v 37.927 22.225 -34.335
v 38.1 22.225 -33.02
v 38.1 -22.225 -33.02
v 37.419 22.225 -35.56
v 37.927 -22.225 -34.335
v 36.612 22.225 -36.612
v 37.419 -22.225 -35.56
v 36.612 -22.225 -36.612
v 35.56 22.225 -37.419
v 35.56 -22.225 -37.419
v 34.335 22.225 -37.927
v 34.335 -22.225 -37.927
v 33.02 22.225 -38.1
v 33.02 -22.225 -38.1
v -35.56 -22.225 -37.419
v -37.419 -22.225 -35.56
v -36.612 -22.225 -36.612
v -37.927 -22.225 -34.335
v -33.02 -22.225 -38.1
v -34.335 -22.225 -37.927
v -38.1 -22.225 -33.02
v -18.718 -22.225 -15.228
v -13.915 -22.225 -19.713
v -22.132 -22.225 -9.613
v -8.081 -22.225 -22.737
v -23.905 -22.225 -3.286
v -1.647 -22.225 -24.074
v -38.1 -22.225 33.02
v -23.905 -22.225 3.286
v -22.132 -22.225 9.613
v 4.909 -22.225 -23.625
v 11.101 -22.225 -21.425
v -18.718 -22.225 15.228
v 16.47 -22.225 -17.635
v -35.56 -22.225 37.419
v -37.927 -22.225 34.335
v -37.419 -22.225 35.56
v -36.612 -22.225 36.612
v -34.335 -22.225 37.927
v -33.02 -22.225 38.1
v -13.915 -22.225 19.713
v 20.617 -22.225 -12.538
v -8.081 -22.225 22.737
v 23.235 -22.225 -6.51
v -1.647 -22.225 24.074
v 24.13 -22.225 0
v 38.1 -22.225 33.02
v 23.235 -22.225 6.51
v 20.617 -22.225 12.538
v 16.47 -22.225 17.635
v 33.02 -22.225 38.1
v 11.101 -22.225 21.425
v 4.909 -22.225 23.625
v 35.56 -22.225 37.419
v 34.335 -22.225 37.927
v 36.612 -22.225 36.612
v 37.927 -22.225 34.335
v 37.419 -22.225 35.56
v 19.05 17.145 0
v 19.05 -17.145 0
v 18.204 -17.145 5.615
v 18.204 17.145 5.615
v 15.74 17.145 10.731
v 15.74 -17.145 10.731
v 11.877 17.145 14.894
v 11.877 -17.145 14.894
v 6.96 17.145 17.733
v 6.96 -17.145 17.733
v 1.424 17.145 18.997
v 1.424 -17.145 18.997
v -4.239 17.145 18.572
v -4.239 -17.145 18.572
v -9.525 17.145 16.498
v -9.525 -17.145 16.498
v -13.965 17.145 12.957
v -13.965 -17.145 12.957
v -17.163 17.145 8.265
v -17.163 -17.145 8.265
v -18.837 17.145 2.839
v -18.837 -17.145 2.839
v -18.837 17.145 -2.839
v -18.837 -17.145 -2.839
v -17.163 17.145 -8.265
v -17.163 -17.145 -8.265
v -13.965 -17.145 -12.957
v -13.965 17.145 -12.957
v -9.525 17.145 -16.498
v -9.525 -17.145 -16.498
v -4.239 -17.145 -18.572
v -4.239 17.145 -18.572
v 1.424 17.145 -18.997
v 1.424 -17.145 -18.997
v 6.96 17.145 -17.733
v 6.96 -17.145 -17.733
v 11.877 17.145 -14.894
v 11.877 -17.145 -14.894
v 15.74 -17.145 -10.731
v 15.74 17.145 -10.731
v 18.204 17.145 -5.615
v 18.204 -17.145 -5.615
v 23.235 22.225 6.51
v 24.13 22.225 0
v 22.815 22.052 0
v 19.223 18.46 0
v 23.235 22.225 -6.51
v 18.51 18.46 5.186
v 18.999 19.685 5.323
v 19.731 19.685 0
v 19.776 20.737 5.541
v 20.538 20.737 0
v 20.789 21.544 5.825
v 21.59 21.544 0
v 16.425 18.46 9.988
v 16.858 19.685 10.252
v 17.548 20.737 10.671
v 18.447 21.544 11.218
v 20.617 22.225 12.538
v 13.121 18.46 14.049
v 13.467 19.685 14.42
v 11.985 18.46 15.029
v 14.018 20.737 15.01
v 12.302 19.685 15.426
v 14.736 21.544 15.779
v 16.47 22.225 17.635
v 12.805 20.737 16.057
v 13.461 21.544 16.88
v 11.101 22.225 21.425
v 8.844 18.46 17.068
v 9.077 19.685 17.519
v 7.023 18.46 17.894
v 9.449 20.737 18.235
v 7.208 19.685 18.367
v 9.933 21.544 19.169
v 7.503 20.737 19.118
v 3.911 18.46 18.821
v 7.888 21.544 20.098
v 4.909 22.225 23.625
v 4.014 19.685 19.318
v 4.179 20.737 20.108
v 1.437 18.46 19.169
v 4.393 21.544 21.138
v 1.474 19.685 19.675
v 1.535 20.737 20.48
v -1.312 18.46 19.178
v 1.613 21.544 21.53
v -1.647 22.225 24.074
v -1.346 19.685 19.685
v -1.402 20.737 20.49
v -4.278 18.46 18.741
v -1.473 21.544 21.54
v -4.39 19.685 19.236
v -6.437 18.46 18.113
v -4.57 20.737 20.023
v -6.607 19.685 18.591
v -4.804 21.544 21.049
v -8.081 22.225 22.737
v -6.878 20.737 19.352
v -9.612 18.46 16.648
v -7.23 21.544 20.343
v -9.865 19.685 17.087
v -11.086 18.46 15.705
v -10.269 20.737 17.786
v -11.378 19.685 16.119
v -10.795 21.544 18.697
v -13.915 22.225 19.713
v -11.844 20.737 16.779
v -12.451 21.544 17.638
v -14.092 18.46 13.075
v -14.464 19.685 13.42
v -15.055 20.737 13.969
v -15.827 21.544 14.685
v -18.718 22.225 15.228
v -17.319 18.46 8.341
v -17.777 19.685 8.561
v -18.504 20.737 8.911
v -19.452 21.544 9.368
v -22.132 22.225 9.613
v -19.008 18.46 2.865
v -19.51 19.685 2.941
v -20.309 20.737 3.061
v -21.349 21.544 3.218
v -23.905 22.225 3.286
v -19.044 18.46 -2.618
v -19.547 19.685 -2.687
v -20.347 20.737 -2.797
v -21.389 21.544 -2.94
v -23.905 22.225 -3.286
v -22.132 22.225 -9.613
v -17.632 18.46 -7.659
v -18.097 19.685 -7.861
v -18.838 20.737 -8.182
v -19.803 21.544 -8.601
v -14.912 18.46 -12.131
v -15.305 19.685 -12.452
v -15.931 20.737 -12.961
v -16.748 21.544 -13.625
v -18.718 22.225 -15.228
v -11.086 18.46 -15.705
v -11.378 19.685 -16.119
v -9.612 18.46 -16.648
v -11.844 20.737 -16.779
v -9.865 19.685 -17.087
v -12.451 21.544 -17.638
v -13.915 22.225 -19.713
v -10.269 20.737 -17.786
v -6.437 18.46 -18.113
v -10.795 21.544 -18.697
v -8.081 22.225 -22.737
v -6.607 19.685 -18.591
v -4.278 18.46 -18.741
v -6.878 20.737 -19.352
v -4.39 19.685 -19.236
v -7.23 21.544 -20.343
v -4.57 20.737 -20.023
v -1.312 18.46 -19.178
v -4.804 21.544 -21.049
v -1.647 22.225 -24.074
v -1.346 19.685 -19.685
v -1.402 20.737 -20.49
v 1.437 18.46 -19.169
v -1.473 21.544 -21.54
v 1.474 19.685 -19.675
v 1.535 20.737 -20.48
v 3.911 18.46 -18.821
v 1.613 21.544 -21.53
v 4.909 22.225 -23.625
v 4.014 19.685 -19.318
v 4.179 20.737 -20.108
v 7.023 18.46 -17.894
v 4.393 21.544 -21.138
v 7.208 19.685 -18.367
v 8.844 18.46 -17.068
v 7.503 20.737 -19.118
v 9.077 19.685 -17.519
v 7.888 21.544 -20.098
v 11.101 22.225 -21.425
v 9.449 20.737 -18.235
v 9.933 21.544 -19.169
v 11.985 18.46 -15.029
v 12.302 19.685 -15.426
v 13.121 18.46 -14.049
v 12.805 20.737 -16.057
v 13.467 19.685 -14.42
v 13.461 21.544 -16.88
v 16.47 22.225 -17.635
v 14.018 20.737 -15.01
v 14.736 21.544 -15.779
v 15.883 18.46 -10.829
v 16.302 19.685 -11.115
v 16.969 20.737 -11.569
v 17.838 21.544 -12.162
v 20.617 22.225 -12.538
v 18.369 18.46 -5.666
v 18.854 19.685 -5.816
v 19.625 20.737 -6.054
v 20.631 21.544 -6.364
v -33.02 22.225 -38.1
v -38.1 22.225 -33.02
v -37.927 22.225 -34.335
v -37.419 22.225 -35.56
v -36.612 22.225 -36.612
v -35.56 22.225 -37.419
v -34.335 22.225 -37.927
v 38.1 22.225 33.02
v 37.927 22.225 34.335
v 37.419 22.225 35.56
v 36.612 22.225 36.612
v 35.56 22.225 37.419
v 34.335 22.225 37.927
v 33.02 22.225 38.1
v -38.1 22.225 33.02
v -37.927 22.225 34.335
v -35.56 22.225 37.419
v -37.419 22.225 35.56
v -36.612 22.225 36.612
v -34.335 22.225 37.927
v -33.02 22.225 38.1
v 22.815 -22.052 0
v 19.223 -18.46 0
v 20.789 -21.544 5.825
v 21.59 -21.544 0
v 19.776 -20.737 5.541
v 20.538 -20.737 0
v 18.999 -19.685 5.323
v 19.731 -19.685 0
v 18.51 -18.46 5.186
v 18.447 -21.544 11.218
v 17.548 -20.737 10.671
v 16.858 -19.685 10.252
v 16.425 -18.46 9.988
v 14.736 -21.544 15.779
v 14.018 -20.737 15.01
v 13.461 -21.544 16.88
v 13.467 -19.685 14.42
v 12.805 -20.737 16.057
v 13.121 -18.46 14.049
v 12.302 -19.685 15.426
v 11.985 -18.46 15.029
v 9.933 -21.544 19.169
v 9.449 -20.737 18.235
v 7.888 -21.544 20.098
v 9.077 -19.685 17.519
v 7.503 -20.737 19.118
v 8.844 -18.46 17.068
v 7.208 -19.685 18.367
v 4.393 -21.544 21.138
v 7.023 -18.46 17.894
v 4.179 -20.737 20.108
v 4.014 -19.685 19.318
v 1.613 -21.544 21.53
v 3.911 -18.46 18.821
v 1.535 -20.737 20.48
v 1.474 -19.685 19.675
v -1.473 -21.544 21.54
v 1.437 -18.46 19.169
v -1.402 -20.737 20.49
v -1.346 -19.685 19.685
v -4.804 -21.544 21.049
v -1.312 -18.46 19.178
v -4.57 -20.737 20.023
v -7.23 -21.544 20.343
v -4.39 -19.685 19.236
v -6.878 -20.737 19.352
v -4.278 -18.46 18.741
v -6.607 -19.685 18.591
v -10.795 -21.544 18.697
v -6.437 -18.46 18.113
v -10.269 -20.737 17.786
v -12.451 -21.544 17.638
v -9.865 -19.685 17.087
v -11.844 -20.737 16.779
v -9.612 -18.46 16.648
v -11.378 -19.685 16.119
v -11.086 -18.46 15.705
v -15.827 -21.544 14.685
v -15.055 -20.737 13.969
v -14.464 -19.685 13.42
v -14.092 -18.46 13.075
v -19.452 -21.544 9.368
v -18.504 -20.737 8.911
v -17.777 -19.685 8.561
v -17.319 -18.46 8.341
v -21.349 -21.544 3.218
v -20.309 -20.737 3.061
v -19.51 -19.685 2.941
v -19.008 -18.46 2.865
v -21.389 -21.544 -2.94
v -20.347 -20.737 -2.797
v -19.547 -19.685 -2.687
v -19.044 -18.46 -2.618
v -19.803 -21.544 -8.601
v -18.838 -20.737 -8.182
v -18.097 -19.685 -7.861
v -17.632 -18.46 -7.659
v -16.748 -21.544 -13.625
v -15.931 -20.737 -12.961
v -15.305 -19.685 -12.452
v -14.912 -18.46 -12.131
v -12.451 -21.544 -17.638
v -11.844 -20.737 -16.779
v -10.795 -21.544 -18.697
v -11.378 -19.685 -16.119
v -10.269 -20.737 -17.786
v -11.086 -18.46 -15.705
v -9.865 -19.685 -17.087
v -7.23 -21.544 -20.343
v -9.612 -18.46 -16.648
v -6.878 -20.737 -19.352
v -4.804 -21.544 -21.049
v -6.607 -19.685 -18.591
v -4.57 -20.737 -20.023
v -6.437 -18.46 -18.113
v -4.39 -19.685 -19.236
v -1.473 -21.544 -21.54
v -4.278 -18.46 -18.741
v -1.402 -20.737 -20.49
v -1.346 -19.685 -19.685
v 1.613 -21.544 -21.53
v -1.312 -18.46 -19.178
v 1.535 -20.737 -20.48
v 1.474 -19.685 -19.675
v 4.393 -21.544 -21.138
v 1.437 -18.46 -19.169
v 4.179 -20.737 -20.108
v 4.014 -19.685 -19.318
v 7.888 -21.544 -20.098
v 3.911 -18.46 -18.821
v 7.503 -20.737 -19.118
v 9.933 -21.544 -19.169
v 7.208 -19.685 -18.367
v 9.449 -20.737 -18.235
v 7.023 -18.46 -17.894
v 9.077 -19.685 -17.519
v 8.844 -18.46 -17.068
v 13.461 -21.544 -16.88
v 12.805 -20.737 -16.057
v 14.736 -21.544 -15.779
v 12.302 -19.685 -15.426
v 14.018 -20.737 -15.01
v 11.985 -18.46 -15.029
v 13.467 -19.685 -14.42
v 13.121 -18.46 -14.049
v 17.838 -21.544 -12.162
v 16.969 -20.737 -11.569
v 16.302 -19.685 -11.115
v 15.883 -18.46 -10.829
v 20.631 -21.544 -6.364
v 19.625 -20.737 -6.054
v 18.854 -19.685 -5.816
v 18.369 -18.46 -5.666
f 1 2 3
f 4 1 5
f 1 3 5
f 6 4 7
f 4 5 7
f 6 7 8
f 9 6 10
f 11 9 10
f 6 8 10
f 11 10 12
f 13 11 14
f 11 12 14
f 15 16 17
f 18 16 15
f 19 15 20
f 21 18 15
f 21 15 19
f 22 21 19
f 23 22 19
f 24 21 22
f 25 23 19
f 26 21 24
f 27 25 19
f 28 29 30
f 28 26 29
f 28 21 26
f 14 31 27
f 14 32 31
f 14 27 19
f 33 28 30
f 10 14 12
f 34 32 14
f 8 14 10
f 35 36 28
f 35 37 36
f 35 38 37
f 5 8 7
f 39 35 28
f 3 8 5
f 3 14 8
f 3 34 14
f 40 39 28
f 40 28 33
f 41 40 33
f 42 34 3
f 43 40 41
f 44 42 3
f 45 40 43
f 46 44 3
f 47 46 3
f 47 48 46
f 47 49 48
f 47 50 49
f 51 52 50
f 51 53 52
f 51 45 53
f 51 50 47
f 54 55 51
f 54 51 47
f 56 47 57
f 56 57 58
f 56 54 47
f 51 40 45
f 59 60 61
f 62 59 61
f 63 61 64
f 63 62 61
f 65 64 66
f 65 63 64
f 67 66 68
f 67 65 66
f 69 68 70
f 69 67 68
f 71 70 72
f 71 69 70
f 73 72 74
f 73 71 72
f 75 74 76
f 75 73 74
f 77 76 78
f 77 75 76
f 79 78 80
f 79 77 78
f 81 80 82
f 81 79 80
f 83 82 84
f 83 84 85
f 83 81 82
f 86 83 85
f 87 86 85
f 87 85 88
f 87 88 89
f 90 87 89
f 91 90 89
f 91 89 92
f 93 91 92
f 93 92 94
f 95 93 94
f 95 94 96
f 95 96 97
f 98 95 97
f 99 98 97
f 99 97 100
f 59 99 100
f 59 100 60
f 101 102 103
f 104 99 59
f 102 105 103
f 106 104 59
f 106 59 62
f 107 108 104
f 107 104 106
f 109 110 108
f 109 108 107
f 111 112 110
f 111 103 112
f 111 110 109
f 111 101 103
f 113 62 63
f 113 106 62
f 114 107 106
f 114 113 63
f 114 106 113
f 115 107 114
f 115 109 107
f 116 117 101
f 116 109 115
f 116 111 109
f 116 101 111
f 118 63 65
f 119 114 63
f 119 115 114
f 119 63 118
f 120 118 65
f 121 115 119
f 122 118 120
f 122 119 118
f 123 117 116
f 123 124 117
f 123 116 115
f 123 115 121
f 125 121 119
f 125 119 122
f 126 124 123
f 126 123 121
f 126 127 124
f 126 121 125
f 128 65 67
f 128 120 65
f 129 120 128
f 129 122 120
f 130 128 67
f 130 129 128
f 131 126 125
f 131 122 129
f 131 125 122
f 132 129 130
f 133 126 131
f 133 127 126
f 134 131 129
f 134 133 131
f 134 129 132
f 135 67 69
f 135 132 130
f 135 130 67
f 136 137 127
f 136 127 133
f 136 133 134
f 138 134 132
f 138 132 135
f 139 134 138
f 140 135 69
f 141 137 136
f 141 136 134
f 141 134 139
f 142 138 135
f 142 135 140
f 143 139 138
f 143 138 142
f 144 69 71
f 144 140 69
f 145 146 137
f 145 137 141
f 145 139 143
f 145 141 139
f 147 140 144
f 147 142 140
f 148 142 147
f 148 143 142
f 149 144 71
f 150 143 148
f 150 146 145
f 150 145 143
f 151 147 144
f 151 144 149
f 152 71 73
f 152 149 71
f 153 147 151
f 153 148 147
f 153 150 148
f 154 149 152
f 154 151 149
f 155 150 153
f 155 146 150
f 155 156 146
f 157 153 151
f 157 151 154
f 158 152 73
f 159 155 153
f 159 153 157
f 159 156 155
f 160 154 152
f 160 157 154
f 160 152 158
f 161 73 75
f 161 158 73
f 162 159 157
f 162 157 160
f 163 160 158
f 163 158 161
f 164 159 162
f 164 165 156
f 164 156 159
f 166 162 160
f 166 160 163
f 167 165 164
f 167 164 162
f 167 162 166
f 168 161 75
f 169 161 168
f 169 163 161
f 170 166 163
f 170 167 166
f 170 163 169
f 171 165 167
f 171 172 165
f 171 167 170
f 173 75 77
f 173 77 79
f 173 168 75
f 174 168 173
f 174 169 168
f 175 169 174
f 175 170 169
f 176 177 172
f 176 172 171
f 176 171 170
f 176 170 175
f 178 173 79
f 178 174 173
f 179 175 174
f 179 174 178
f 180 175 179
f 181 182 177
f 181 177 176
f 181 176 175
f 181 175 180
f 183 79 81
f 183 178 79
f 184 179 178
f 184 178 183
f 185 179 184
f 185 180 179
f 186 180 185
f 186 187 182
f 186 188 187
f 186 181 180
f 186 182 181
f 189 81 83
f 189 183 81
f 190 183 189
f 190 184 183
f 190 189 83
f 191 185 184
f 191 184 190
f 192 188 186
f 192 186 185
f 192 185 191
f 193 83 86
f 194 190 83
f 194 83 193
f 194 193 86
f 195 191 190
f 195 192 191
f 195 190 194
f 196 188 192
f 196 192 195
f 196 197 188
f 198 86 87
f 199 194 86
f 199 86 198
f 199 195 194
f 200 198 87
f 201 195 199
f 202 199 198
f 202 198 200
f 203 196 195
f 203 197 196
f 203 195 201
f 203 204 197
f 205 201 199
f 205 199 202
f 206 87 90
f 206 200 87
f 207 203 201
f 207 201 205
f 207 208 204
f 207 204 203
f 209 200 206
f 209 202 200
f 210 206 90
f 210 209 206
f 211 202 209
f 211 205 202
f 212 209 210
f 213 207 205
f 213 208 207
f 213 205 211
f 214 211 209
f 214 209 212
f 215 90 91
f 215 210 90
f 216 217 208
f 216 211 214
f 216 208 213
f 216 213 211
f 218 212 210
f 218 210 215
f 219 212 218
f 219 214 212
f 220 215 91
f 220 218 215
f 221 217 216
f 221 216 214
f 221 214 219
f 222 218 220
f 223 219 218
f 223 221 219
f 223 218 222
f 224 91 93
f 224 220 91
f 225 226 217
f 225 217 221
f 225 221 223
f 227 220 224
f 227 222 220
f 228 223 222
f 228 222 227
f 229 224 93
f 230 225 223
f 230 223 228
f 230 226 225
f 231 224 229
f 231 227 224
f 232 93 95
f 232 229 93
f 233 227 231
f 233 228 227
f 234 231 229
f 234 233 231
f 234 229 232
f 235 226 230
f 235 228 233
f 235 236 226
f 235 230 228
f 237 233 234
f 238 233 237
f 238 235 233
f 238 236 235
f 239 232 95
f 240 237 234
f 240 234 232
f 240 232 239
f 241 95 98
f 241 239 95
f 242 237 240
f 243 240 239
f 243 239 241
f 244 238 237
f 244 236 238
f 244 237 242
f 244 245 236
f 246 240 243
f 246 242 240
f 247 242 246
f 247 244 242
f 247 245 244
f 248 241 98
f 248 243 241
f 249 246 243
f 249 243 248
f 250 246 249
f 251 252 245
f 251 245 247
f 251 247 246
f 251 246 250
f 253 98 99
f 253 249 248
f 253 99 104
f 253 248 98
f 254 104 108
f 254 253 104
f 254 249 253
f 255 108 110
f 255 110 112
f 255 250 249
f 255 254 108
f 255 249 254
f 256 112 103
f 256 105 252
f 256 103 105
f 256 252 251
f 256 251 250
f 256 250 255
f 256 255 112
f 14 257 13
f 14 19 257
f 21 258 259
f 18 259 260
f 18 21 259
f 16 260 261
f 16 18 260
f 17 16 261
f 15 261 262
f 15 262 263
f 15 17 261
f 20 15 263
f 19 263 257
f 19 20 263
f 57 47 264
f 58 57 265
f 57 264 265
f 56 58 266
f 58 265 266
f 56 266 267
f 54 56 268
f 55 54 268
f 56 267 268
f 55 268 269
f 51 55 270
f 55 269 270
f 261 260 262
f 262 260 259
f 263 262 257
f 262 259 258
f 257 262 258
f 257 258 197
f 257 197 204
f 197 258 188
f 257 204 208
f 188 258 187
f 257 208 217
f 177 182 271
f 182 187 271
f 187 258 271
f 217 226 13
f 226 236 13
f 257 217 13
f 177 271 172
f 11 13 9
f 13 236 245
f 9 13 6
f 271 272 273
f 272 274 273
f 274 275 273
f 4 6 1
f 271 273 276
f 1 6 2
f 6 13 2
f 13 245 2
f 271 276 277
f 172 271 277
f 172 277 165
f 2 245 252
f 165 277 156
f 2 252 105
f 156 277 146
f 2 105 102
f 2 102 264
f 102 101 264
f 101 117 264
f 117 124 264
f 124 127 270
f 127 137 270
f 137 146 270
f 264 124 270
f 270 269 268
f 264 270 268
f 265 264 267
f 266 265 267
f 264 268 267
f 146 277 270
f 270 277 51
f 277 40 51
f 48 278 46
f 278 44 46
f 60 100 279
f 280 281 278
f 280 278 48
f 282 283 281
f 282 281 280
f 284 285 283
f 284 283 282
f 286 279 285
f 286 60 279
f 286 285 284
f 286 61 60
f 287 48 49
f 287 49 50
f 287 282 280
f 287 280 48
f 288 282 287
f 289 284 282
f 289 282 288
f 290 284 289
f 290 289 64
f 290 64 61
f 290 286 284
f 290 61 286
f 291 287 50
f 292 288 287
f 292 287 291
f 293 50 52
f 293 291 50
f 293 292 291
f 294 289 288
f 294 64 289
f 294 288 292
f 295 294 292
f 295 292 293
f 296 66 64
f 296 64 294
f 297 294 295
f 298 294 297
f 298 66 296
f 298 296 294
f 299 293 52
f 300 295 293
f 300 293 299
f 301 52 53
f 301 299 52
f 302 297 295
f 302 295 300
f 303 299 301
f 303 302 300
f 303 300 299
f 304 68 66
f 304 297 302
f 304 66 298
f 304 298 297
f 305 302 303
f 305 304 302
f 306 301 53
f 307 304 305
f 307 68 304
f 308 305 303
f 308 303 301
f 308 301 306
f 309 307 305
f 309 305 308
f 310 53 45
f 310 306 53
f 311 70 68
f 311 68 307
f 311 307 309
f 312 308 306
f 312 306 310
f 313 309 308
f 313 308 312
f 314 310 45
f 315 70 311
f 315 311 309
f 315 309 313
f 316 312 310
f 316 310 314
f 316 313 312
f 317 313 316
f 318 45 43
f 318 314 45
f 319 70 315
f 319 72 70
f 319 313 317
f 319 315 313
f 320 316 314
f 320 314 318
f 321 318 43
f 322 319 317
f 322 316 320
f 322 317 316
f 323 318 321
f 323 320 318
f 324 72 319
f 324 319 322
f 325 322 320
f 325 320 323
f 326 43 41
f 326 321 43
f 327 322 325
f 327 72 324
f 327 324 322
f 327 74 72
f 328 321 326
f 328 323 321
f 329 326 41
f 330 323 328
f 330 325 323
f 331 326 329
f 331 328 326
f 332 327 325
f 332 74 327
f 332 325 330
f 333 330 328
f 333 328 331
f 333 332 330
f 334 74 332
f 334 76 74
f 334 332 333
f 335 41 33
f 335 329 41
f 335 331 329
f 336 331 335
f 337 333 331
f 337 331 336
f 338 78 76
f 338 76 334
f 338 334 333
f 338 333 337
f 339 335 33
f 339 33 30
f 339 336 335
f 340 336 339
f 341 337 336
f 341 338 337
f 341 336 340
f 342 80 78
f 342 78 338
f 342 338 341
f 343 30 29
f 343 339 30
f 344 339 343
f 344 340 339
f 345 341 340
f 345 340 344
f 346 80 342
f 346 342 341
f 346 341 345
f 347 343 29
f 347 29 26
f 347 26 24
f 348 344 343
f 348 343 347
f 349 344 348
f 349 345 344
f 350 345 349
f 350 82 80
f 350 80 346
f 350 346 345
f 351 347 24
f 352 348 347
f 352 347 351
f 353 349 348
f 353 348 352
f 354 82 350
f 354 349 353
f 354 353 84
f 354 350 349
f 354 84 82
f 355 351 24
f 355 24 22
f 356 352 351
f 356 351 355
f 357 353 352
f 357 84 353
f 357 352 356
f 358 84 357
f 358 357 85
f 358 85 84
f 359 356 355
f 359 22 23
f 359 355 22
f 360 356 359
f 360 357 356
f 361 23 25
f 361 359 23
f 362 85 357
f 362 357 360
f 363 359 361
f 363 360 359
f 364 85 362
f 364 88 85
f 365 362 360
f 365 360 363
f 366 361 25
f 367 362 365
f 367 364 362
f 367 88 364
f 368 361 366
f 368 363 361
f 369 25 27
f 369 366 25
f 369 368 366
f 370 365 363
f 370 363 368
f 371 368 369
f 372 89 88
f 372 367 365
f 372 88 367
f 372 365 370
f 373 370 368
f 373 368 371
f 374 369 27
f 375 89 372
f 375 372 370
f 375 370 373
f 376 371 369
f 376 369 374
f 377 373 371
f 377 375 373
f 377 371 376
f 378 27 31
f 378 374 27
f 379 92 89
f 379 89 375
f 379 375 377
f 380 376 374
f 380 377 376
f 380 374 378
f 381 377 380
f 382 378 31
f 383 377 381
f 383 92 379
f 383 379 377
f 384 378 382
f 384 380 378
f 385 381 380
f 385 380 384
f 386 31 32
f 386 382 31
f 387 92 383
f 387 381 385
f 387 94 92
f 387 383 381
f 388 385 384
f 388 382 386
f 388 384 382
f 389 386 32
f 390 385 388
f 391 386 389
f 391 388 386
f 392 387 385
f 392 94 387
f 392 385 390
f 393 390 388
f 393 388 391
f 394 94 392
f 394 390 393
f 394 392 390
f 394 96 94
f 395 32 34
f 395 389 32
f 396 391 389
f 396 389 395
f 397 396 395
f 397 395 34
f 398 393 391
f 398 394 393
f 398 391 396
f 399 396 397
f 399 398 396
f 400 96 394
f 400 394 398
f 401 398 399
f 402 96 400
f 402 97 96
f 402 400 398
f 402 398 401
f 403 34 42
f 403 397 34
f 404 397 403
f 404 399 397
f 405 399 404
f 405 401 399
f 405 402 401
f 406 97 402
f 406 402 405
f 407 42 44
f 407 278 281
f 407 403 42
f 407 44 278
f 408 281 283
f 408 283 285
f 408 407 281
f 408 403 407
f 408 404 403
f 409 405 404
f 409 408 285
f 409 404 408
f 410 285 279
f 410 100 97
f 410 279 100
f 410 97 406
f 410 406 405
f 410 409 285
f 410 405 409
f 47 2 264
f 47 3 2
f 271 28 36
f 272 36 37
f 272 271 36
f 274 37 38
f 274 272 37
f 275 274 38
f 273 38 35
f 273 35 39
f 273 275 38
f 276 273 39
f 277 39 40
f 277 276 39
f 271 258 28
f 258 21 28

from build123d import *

# Parameters (mm, degrees)
F0_W     = 76.2
F0_H     = 76.2
F0_R     = 19.05
F1_DEPTH = 22.225
F2_R     = 5.08


with BuildPart() as f1:
    # F0 (on Front) → F1 (new body, symmetric)
    with BuildSketch(Plane.XZ):
        Rectangle(F0_W, F0_H)
        Circle(F0_R, mode=Mode.SUBTRACT)
    extrude(amount=F1_DEPTH, both=True)

    # F2
    f2_edges = [f1.edges().sort_by_distance(p)[0] for p in [
        (38.1, 0, 38.1),
        (-38.1, 0, 38.1),
        (38.1, 0, -38.1),
        (-38.1, 0, -38.1),
        (-19.05, -22.225, 0),
        (-19.05, 22.225, 0),
    ]]
    fillet(f2_edges, radius=F2_R)


solid = f1.part
